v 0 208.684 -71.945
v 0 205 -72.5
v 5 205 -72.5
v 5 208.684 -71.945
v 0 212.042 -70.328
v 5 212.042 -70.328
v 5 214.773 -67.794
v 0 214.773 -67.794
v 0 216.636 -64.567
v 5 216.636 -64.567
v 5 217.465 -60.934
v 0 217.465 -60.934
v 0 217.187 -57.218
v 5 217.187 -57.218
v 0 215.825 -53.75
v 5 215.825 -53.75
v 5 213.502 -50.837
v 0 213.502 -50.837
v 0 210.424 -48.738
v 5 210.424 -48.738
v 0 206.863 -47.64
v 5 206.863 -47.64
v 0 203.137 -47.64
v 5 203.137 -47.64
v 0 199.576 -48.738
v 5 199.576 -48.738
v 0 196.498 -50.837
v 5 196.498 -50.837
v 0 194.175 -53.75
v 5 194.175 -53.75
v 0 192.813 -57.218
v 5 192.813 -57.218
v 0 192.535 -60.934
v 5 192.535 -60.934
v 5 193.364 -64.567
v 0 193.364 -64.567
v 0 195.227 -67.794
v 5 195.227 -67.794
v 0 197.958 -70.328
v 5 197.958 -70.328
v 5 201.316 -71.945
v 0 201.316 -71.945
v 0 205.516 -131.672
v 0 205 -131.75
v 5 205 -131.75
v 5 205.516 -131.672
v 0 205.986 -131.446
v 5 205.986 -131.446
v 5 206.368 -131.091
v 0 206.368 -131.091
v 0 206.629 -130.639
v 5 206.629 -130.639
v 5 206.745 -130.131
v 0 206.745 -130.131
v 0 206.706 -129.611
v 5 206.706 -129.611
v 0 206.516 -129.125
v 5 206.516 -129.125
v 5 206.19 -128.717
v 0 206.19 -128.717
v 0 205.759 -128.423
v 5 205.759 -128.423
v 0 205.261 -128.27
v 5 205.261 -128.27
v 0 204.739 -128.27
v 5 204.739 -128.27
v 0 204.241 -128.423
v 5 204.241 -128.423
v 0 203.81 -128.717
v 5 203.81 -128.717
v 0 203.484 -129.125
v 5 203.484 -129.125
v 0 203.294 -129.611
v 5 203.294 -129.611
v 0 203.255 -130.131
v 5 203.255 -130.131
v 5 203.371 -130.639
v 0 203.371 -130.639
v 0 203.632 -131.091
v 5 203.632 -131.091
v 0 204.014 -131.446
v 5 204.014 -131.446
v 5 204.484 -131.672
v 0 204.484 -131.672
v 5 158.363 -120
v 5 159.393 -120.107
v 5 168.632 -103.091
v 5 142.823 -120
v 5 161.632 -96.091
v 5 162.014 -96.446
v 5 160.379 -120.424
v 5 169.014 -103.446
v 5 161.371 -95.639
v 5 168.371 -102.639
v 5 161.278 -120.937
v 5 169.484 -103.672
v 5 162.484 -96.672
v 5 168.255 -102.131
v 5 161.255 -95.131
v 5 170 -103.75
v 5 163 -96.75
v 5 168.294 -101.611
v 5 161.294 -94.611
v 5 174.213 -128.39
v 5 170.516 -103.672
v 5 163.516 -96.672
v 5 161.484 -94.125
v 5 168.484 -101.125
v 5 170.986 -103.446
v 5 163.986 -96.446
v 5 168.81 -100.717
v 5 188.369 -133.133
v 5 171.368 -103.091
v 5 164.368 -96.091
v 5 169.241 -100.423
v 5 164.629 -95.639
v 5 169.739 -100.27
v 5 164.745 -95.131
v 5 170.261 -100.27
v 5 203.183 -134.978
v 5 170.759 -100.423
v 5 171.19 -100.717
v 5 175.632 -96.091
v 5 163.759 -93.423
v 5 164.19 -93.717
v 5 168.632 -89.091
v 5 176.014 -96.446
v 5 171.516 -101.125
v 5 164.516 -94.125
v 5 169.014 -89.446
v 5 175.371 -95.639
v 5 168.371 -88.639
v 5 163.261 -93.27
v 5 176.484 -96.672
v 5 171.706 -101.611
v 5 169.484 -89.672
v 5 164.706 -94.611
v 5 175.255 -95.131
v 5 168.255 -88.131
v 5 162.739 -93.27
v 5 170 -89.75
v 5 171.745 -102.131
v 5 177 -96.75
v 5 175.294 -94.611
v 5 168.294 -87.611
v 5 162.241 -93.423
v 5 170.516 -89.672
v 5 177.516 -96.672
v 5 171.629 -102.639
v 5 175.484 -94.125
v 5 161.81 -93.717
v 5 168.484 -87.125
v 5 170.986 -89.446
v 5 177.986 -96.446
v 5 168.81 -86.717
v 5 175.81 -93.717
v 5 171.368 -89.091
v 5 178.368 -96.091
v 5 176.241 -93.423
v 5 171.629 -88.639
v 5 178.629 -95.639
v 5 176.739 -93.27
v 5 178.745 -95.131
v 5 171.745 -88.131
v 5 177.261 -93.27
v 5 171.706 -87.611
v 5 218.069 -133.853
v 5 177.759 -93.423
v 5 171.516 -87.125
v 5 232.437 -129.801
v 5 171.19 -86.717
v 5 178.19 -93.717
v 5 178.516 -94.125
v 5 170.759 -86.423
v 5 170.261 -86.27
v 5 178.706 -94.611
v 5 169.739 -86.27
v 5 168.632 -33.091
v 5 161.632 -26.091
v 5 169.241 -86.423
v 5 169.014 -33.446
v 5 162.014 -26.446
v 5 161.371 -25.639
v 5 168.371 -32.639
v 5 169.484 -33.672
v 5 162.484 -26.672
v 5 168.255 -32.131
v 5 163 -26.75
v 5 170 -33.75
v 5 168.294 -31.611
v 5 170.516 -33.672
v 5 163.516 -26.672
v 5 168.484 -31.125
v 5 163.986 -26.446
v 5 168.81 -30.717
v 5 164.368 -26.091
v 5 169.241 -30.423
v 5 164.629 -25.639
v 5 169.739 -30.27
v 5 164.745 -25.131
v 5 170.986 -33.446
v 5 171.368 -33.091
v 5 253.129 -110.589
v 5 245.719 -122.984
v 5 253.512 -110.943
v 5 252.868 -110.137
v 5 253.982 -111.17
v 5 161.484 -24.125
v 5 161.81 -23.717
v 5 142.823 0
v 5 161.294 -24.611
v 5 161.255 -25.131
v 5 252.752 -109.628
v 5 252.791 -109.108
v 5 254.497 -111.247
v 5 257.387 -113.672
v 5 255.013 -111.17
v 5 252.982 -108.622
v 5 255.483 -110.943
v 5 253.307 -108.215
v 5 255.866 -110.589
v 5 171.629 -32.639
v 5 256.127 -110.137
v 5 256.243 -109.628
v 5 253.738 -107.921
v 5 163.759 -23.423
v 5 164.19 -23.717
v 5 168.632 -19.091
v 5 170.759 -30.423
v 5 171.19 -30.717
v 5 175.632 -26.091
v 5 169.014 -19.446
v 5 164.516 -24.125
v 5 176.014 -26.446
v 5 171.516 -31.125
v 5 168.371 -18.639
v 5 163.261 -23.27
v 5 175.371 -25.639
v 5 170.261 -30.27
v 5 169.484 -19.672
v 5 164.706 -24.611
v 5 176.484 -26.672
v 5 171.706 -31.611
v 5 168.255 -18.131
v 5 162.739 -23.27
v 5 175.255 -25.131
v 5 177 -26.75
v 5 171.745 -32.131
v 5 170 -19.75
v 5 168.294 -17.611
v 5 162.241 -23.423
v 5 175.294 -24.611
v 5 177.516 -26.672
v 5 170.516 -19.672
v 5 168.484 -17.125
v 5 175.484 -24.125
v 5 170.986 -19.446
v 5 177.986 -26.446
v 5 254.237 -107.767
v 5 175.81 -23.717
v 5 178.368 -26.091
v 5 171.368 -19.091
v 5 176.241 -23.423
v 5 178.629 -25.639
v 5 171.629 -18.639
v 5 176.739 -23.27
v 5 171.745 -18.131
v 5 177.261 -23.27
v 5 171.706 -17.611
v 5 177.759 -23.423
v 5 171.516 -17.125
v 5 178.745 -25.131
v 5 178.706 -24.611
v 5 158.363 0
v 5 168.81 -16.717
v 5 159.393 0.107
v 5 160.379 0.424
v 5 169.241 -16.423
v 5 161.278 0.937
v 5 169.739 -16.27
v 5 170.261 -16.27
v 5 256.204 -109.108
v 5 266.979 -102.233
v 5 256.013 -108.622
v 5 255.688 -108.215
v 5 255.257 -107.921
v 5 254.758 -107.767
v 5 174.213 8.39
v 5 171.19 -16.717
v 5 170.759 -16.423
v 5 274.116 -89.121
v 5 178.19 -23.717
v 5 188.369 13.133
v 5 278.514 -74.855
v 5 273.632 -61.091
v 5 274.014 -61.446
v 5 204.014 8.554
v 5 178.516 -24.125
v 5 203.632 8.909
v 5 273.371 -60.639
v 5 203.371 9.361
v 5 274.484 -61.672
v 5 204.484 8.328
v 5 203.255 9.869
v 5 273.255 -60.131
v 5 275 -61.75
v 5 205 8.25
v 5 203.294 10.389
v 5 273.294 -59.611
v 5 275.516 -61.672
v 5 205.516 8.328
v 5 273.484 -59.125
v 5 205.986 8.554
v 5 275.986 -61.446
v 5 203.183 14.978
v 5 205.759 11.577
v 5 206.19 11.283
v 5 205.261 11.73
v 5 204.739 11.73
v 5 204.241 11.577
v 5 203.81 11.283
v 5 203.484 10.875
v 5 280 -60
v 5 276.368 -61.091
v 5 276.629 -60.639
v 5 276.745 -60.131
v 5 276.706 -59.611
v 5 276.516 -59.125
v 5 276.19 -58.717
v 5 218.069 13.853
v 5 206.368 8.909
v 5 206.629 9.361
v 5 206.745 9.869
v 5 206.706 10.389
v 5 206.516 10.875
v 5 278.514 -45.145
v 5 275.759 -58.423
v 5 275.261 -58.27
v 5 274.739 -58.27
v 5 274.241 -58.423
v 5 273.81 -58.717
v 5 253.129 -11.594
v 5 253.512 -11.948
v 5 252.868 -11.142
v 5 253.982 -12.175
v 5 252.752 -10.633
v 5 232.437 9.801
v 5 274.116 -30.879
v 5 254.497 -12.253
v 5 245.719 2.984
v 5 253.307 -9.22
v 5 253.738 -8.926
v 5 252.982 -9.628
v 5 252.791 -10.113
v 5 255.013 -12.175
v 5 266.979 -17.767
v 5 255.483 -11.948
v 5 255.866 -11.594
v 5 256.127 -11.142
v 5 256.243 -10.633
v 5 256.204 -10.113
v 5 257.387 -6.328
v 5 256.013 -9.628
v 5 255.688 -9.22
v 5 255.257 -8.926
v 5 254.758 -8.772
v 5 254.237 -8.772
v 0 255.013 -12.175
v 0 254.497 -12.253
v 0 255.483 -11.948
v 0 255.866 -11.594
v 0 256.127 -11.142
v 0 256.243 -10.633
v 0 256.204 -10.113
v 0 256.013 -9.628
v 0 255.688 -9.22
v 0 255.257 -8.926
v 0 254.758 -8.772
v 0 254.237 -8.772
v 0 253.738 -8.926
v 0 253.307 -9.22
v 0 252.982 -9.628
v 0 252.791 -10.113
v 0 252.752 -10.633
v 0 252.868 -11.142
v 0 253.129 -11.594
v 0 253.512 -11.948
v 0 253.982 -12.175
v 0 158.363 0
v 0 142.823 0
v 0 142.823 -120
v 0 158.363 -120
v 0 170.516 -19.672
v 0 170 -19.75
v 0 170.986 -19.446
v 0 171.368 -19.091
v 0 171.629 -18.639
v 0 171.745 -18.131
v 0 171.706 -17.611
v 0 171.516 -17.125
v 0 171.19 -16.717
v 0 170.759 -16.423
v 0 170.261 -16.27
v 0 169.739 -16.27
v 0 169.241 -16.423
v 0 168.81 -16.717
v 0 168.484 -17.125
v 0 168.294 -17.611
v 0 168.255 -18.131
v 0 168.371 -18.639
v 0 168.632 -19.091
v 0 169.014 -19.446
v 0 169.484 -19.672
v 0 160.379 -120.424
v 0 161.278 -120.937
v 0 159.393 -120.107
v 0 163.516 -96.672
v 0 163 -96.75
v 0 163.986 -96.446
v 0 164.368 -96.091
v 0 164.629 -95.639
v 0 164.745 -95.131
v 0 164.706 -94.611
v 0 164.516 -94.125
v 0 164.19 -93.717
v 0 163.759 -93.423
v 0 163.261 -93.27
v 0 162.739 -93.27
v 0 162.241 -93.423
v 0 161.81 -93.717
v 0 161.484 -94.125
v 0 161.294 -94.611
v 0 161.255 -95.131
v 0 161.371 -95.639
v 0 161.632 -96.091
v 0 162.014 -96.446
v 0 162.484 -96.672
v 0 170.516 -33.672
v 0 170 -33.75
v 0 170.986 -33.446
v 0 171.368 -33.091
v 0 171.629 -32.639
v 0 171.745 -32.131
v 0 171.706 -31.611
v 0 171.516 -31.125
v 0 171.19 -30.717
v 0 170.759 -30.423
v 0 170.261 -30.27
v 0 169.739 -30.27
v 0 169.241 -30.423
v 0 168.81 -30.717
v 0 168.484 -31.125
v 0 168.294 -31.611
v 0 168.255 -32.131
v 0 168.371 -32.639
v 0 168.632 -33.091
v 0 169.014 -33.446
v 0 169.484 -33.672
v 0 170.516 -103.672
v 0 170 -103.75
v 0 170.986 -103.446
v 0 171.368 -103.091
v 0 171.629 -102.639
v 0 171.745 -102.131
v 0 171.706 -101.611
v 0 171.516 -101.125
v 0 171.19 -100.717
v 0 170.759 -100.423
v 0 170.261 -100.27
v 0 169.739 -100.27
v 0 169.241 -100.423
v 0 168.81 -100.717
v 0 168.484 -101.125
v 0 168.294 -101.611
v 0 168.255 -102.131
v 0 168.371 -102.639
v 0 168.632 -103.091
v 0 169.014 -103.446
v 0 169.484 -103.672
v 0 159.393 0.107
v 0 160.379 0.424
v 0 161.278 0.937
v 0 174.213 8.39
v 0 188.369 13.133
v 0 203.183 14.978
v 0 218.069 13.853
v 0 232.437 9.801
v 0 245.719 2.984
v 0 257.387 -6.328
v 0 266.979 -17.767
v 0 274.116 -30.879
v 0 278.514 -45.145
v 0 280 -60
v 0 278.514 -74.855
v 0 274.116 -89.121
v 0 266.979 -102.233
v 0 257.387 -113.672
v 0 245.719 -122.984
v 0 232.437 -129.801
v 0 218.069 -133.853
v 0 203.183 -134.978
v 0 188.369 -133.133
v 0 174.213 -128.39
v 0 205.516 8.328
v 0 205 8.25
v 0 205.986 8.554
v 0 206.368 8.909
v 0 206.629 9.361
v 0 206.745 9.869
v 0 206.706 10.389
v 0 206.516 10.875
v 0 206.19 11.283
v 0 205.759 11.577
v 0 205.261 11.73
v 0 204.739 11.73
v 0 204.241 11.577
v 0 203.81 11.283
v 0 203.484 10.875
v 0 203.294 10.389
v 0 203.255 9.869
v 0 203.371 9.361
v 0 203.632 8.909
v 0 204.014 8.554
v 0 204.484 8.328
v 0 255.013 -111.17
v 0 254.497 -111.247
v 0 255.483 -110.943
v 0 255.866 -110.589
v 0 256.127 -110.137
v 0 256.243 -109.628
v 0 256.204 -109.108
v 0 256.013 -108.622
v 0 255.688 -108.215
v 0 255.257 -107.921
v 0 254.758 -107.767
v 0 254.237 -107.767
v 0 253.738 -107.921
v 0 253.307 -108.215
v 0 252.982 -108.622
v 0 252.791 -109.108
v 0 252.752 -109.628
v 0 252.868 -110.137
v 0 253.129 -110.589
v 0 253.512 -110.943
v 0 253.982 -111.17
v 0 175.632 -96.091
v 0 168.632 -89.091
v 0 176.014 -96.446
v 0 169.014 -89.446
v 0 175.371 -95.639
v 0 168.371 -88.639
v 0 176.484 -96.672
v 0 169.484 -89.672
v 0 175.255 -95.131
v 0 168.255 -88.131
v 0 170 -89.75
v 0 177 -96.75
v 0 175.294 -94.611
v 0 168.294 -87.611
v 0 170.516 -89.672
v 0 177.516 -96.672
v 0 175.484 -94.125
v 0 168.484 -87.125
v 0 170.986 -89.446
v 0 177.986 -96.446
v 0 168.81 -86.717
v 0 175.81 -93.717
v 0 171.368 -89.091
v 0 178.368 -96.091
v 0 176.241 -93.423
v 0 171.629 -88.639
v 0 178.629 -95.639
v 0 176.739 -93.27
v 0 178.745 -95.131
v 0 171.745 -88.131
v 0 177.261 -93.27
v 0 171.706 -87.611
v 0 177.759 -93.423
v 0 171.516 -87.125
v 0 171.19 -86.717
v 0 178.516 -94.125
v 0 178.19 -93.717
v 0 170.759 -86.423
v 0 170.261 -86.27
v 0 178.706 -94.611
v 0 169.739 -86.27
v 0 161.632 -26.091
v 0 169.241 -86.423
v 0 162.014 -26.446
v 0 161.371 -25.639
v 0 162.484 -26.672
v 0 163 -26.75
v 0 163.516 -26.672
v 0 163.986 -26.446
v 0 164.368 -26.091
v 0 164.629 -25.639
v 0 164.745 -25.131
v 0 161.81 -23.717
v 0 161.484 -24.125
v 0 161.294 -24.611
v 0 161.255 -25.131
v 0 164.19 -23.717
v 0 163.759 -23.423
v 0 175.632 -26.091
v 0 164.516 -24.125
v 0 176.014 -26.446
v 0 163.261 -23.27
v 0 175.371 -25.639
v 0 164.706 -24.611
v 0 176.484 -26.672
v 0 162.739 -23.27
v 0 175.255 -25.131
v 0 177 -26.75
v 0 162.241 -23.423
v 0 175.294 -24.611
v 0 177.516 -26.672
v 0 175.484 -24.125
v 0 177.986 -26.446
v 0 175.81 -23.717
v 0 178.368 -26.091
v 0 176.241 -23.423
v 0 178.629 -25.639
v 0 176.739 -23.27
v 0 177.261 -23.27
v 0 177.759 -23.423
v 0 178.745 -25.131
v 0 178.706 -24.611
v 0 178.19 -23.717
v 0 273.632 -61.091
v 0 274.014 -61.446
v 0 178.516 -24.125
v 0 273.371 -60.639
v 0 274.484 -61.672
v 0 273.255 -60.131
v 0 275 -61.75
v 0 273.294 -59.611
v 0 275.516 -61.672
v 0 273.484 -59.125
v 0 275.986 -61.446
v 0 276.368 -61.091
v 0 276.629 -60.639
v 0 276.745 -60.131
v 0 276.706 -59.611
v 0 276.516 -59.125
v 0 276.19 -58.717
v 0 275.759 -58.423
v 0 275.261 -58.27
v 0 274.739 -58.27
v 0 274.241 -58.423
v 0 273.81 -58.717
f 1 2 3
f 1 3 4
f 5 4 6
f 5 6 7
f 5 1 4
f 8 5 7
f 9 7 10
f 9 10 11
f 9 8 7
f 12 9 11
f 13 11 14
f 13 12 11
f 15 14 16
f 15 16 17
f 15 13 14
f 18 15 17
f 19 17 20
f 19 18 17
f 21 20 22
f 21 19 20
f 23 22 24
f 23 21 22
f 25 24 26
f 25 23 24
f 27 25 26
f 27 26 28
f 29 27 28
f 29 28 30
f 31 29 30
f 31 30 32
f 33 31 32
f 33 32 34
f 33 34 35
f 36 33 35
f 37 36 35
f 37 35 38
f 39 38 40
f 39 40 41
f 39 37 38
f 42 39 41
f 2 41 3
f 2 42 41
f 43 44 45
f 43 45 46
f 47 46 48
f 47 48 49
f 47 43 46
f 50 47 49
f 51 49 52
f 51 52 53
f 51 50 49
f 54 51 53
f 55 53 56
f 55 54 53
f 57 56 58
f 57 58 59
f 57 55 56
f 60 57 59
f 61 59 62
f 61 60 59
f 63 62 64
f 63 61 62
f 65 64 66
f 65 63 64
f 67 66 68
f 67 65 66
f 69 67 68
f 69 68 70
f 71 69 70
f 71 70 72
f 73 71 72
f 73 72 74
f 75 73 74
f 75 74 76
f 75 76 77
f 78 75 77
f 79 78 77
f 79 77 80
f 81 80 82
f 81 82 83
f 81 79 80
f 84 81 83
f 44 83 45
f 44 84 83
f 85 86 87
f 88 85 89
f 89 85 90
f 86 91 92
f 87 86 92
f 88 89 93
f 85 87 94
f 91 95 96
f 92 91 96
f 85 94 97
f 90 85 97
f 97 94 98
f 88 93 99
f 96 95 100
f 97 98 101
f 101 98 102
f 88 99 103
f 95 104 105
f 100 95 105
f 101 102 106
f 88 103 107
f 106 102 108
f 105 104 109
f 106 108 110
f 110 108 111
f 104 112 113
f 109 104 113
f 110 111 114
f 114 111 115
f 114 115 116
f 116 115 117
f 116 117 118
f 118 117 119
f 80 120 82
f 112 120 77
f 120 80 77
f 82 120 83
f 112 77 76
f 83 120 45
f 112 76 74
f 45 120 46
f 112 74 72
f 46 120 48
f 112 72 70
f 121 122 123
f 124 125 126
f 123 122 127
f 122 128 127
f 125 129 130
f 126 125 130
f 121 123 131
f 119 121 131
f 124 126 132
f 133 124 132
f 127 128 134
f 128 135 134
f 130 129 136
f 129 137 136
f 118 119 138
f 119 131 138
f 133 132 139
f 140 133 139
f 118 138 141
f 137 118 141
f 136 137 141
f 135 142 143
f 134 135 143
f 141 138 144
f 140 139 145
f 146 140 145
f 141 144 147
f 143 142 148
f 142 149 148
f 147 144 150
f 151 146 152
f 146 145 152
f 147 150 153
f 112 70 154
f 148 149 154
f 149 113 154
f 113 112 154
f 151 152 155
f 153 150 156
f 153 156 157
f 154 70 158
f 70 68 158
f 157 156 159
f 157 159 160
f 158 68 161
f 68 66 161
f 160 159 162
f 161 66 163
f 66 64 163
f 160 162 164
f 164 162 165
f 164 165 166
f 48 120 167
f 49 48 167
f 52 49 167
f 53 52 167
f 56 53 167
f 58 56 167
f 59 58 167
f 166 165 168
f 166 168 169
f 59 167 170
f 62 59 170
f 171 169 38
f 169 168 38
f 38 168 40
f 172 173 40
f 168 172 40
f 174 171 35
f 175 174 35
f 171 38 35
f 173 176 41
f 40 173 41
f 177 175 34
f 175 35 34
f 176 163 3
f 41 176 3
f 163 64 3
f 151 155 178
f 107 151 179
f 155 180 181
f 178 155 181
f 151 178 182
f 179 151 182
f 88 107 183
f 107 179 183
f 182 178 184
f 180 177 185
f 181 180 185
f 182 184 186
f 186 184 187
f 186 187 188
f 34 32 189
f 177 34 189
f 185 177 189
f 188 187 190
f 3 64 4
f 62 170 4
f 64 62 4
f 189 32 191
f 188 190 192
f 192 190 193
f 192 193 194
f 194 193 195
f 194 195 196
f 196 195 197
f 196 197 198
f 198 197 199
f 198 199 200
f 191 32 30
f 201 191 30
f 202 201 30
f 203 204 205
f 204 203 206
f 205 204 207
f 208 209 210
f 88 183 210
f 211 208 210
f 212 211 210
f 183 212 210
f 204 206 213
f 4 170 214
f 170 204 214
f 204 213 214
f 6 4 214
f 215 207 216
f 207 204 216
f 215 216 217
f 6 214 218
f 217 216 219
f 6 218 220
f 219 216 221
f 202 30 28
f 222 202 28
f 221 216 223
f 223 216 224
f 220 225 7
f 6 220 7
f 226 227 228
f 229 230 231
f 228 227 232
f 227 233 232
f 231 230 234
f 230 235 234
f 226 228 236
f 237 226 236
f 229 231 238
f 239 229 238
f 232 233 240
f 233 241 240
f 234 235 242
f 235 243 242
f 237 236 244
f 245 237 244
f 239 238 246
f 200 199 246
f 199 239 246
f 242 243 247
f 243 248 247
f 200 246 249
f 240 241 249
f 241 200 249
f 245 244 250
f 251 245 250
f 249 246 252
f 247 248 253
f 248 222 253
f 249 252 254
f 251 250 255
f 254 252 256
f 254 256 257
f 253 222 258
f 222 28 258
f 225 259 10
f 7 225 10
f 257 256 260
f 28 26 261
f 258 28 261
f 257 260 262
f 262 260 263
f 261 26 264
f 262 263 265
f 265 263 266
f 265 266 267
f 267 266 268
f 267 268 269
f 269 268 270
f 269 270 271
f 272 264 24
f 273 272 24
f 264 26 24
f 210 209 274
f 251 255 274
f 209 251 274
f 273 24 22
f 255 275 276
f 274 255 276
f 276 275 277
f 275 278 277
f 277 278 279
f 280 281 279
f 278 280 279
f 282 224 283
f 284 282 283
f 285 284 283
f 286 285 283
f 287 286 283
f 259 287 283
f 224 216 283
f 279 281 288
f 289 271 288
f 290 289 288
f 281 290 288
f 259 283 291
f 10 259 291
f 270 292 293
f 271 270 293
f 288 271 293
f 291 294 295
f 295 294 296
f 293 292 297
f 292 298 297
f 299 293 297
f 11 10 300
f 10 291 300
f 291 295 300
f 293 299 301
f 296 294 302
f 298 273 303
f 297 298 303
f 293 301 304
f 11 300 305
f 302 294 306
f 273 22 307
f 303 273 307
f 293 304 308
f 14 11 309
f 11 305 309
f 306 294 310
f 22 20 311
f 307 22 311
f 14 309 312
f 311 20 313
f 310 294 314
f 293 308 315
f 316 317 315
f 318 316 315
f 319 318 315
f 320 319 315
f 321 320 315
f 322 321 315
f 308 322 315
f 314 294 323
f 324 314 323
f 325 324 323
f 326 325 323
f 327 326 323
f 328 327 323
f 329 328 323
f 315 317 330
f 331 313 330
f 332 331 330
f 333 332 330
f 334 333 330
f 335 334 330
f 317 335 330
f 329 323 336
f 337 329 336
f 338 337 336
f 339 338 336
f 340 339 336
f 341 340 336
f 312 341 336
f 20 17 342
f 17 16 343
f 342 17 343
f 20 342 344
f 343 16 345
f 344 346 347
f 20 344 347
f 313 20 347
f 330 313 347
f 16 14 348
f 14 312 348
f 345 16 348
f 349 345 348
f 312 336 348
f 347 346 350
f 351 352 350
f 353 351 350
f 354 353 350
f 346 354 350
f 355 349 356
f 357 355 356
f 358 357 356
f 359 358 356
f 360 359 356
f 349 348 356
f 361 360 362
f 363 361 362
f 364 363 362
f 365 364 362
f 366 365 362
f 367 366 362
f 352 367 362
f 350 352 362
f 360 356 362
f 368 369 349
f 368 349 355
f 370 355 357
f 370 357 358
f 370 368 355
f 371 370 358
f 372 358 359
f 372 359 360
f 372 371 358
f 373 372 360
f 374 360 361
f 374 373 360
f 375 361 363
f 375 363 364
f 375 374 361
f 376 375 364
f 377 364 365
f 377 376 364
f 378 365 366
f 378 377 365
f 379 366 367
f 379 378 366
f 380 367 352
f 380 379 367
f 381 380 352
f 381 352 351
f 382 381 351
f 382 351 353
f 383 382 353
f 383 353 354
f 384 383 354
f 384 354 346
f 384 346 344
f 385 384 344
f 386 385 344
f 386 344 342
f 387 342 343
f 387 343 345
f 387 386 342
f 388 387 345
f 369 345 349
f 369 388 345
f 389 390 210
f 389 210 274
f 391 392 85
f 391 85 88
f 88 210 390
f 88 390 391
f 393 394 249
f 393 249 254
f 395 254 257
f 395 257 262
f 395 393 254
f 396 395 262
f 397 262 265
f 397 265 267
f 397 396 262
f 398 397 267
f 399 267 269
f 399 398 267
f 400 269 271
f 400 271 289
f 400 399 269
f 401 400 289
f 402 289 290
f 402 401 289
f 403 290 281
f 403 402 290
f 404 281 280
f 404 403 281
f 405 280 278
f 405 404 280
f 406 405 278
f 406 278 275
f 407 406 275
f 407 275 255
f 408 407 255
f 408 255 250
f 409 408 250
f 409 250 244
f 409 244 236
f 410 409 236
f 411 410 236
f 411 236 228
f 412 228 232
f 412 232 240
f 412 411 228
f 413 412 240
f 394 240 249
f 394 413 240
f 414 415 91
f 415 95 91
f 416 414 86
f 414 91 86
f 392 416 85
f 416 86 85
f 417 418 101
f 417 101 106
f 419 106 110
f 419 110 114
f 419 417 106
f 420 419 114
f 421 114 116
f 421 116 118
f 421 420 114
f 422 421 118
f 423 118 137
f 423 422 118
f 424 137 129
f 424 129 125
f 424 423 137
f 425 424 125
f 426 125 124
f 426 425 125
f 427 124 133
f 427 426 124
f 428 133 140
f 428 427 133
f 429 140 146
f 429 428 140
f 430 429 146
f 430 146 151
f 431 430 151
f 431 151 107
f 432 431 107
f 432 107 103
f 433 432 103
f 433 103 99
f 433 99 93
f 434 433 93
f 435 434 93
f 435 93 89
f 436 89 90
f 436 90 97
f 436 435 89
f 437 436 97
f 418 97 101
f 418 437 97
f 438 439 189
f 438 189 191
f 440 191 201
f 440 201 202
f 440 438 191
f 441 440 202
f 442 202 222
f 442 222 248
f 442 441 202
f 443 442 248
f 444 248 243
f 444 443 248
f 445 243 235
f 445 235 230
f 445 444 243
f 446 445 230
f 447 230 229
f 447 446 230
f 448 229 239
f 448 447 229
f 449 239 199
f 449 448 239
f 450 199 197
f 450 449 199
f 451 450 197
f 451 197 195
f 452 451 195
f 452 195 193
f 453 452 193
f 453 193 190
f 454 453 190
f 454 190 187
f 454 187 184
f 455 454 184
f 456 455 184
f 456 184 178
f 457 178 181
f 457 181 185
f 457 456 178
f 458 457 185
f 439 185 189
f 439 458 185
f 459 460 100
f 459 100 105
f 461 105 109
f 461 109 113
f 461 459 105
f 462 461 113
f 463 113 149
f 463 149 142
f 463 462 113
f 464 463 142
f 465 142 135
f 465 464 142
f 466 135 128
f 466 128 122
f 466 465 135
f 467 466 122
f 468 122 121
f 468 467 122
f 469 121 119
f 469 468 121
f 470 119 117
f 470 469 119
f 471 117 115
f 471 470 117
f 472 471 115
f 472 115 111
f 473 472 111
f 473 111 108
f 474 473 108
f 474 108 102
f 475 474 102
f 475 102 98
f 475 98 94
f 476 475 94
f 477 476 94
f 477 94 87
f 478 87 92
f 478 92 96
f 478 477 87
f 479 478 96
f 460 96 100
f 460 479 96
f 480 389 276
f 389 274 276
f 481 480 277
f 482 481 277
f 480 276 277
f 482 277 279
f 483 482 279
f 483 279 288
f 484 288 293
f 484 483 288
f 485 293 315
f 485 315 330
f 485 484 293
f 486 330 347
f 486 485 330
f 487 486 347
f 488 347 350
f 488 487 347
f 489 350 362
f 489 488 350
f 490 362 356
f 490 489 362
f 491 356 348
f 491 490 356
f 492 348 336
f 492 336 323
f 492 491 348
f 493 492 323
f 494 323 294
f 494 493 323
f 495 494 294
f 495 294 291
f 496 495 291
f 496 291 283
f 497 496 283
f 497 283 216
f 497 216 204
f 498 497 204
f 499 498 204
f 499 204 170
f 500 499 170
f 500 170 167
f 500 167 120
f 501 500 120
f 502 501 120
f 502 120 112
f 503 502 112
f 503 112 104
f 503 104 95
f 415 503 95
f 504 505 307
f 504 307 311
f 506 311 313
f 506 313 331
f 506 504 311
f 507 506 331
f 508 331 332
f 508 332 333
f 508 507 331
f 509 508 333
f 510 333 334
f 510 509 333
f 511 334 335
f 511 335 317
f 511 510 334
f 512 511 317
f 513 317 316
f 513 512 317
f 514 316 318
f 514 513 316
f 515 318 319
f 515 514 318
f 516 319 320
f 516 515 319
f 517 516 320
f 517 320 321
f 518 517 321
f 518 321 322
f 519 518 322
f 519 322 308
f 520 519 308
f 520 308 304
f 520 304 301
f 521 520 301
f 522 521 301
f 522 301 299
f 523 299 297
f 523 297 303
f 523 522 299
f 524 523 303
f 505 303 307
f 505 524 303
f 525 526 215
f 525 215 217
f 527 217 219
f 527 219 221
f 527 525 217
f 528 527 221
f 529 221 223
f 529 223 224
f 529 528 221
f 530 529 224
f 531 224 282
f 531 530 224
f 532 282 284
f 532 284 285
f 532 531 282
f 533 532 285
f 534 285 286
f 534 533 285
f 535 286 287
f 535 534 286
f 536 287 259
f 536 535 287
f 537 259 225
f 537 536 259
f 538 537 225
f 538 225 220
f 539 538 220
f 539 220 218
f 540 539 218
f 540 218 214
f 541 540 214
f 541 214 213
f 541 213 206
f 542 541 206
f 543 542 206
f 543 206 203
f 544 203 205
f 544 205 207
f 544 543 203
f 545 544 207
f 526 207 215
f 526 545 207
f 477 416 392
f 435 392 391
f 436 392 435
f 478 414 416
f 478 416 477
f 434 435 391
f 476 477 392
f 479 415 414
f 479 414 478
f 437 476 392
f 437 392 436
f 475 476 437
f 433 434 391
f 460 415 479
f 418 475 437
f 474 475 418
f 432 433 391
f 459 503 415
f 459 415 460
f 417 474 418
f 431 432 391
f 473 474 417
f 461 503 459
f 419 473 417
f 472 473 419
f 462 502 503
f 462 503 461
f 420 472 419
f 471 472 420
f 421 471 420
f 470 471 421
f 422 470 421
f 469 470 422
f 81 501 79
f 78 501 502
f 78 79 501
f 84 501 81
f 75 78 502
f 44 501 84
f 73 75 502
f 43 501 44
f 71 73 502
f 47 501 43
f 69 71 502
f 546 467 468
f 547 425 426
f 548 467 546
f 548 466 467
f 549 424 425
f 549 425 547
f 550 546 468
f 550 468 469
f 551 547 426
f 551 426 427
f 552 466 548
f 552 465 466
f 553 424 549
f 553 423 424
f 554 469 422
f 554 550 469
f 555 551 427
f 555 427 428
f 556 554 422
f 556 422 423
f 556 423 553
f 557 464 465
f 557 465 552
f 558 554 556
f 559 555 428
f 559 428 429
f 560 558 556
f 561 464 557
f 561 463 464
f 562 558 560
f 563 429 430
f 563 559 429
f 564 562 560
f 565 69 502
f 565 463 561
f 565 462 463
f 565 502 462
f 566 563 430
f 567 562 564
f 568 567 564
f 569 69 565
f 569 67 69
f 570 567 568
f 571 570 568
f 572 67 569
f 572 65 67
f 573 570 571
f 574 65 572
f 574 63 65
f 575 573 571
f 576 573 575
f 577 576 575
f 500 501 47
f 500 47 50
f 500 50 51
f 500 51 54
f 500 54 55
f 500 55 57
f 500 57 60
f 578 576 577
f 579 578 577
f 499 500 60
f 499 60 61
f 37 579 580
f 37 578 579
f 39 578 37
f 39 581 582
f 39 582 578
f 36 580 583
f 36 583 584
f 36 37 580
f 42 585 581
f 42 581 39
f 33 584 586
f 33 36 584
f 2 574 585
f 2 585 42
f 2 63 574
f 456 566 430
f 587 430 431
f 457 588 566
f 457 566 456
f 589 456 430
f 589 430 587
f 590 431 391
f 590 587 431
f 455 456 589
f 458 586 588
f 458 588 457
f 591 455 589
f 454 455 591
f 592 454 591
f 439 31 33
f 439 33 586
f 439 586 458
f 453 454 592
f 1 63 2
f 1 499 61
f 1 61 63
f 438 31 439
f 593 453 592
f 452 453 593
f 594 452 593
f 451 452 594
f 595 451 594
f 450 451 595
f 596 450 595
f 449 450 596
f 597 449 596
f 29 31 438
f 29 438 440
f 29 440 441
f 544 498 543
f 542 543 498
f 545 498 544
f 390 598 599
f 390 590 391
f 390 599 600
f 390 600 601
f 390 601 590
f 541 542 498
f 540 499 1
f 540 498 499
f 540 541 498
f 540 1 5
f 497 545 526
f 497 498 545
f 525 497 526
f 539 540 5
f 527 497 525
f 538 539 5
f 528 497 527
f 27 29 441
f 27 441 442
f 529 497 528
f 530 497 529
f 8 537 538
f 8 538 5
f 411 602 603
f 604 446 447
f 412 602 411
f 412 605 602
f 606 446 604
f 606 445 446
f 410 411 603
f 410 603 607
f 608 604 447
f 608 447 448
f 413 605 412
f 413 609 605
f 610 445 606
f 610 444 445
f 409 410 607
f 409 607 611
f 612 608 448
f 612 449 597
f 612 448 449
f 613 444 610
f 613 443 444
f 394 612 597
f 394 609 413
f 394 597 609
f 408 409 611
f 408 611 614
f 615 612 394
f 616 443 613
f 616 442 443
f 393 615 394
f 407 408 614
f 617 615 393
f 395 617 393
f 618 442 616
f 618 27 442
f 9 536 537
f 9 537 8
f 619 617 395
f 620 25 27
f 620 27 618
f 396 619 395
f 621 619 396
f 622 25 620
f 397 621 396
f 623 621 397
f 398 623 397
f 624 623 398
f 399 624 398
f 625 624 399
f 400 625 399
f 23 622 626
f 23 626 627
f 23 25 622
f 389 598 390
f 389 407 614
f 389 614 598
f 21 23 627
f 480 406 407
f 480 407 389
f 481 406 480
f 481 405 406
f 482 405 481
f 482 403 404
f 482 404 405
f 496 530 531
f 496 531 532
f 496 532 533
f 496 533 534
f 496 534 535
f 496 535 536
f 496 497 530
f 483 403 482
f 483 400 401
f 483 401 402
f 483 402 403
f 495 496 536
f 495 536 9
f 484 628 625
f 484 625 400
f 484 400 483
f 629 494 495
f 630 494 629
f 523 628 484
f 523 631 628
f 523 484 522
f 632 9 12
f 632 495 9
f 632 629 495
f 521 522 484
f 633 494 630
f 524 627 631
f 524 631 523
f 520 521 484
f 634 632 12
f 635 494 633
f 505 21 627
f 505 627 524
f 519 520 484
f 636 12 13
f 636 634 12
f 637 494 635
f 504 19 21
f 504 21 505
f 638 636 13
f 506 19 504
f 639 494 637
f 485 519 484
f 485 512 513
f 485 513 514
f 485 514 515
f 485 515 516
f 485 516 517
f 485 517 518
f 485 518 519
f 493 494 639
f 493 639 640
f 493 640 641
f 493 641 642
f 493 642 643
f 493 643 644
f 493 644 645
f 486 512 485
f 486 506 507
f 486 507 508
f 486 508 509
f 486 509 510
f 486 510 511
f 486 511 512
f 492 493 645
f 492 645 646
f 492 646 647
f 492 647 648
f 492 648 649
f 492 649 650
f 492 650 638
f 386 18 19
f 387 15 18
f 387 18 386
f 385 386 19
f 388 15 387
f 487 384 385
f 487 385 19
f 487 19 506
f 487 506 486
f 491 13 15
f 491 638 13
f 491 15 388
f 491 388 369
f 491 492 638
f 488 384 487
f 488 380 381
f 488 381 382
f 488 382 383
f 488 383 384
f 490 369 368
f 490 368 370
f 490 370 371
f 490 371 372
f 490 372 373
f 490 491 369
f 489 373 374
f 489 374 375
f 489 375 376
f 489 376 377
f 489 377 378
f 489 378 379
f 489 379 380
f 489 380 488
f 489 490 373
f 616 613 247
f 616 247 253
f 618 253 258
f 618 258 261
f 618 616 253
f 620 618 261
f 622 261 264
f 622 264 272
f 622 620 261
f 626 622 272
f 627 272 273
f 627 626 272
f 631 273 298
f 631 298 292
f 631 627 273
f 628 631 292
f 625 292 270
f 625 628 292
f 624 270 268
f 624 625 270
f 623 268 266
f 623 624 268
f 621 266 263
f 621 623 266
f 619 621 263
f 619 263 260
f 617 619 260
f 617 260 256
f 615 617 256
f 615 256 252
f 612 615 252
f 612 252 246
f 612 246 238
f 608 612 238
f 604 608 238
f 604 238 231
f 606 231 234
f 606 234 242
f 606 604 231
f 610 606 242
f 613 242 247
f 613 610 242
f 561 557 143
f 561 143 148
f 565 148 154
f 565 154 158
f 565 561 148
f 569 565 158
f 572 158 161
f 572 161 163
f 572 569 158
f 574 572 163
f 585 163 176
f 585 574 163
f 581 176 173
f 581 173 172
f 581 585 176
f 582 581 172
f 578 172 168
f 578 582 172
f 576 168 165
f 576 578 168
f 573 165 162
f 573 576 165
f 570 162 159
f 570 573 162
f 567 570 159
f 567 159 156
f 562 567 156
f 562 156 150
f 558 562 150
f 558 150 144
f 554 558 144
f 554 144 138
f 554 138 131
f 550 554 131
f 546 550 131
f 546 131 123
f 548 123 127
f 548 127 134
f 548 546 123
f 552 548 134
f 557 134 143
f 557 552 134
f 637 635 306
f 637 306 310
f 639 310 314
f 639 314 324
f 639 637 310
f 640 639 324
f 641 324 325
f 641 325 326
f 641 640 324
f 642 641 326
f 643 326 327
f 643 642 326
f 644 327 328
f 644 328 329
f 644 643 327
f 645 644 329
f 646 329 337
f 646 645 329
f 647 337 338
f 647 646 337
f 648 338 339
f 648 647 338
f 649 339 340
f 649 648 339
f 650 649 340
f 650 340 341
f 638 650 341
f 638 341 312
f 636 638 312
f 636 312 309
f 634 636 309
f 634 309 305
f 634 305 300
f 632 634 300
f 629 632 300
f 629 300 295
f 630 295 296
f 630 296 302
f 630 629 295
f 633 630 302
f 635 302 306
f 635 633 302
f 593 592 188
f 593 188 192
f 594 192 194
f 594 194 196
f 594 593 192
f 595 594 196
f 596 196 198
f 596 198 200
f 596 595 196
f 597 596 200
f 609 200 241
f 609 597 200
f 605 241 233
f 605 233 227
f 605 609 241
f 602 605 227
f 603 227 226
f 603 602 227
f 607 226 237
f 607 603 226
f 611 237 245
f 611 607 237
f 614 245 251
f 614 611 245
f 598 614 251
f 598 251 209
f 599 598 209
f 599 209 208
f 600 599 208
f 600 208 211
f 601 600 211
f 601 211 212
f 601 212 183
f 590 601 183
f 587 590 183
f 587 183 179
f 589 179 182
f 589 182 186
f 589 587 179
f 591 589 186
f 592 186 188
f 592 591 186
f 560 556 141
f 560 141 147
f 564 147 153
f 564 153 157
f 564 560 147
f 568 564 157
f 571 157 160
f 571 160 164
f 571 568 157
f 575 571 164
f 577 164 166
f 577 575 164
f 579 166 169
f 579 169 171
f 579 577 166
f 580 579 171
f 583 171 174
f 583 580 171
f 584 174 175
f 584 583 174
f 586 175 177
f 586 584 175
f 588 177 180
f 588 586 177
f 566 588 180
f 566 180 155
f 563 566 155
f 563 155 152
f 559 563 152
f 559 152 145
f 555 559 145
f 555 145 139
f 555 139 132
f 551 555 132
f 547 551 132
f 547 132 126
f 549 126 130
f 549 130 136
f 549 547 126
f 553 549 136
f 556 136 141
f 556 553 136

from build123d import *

# Parameters (mm, degrees)
SKETCH_1_R          = 12.5
SKETCH_1_R_2        = 1.75
EXTRUDE_1_DEPTH     = 5
FILLET_1_R          = 5
SKETCH_3_R          = 1.1
CUT_EXTRUDE_2_DEPTH = 10
SKETCH_4_R          = 1.5
CUT_EXTRUDE_3_DEPTH = 10
EXTRUDE2_DEPTH      = 311.885831134
EXTRUDE2_DEPTH_BACK = 311.885831134


with BuildPart() as part:
    # 草图1 → 凸台-拉伸1 (new body)
    with BuildSketch(Plane(origin=(0, 0, 0), x_dir=(0, 0, -1), z_dir=(1, 0, 0))):
        with BuildLine():
            Line((0, 0), (0, 160))
            ThreePointArc((0, 160), (60, 280), (120, 160))
            Line((120, 160), (120, 0))
            Line((120, 0), (0, 0))
        make_face()
        with Locations((60, 205)):
            Circle(SKETCH_1_R, mode=Mode.SUBTRACT)
        with Locations((25, 177)):
            Circle(SKETCH_1_R_2, mode=Mode.SUBTRACT)
        with Locations((32, 170)):
            Circle(SKETCH_1_R_2, mode=Mode.SUBTRACT)
        with Locations((25, 163)):
            Circle(SKETCH_1_R_2, mode=Mode.SUBTRACT)
        with Locations((18, 170)):
            Circle(SKETCH_1_R_2, mode=Mode.SUBTRACT)
        with Locations((95, 177)):
            Circle(SKETCH_1_R_2, mode=Mode.SUBTRACT)
        with Locations((102, 170)):
            Circle(SKETCH_1_R_2, mode=Mode.SUBTRACT)
        with Locations((95, 163)):
            Circle(SKETCH_1_R_2, mode=Mode.SUBTRACT)
        with Locations((88, 170)):
            Circle(SKETCH_1_R_2, mode=Mode.SUBTRACT)
        with Locations((39, 140)):
            Circle(SKETCH_1_R_2, mode=Mode.SUBTRACT)
        with Locations((81, 140)):
            Circle(SKETCH_1_R_2, mode=Mode.SUBTRACT)
        with Locations((60, 275)):
            Circle(SKETCH_1_R_2, mode=Mode.SUBTRACT)
        with Locations((-10, 205)):
            Circle(SKETCH_1_R_2, mode=Mode.SUBTRACT)
        with Locations((130, 205)):
            Circle(SKETCH_1_R_2, mode=Mode.SUBTRACT)
        with Locations((10.502525317, 254.497474683)):
            Circle(SKETCH_1_R_2, mode=Mode.SUBTRACT)
        with Locations((109.497474683, 254.497474683)):
            Circle(SKETCH_1_R_2, mode=Mode.SUBTRACT)
        with Locations((5, 5)):
            Circle(SKETCH_1_R_2, mode=Mode.SUBTRACT)
        with Locations((115, 5)):
            Circle(SKETCH_1_R_2, mode=Mode.SUBTRACT)
        with Locations((5, 120)):
            Circle(SKETCH_1_R_2, mode=Mode.SUBTRACT)
        with Locations((115, 120)):
            Circle(SKETCH_1_R_2, mode=Mode.SUBTRACT)
        with BuildLine():
            Line((40.5, 81), (40.5, 59))
            ThreePointArc((40.5, 59), (39, 57.5), (37.5, 59))
            Line((37.5, 59), (37.5, 81))
            ThreePointArc((37.5, 81), (39, 82.5), (40.5, 81))
        make_face(mode=Mode.SUBTRACT)
        with BuildLine():
            Line((79.5, 81), (79.5, 59))
            ThreePointArc((79.5, 59), (81, 57.5), (82.5, 59))
            Line((82.5, 59), (82.5, 81))
            ThreePointArc((82.5, 81), (81, 82.5), (79.5, 81))
        make_face(mode=Mode.SUBTRACT)
    extrude(amount=EXTRUDE_1_DEPTH)

    # 圆角1
    fillet_1_edges = [part.edges().sort_by_distance(p)[0] for p in [
        (2.5, 0, 0),
        (2.5, 160, 0),
        (2.5, 160, -120),
        (2.5, 0, -120),
    ]]
    fillet(fillet_1_edges, radius=FILLET_1_R)

    # 草图3 → 切除-拉伸2 (cut)
    with BuildSketch(Plane.ZY):
        with Locations((-45.818141739, 127.45827935)):
            Circle(SKETCH_3_R)
        with Locations((-61.818141739, 127.45827935)):
            Circle(SKETCH_3_R)
        with Locations((-45.818141739, 91.45827935)):
            Circle(SKETCH_3_R)
        with Locations((-61.818141739, 91.45827935)):
            Circle(SKETCH_3_R)
        with BuildLine():
            Line((-20, 46.75), (-30, 46.75))
            ThreePointArc((-30, 46.75), (-31.75, 48.5), (-30, 50.25))
            Line((-30, 50.25), (-20, 50.25))
            ThreePointArc((-20, 50.25), (-18.25, 48.5), (-20, 46.75))
        make_face()
        with BuildLine():
            Line((-90, 46.75), (-100, 46.75))
            ThreePointArc((-100, 46.75), (-101.75, 48.5), (-100, 50.25))
            Line((-100, 50.25), (-90, 50.25))
            ThreePointArc((-90, 50.25), (-88.25, 48.5), (-90, 46.75))
        make_face()
        with BuildLine():
            Line((-20, 8.25), (-30, 8.25))
            ThreePointArc((-30, 8.25), (-31.75, 10), (-30, 11.75))
            Line((-30, 11.75), (-20, 11.75))
            ThreePointArc((-20, 11.75), (-18.25, 10), (-20, 8.25))
        make_face()
        with BuildLine():
            Line((-90, 8.25), (-100, 8.25))
            ThreePointArc((-100, 8.25), (-101.75, 10), (-100, 11.75))
            Line((-100, 11.75), (-90, 11.75))
            ThreePointArc((-90, 11.75), (-88.25, 10), (-90, 8.25))
        make_face()
    extrude(amount=-CUT_EXTRUDE_2_DEPTH, mode=Mode.SUBTRACT)

    # 草图4 → 切除-拉伸3 (cut)
    with BuildSketch(Plane.ZY):
        with Locations((-16.118918229, 88.740617872)):
            Circle(SKETCH_4_R)
        with Locations((-16.118918229, 64.240617872)):
            Circle(SKETCH_4_R)
        with Locations((-94, 140)):
            Circle(SKETCH_4_R)
        with Locations((-26, 140)):
            Circle(SKETCH_4_R)
        with Locations((-94, 82)):
            Circle(SKETCH_4_R)
        with Locations((-26, 82)):
            Circle(SKETCH_4_R)
    extrude(amount=-CUT_EXTRUDE_3_DEPTH, mode=Mode.SUBTRACT)

    # Sketch1 → Extrude2 (cut, two sides: drawn at the far end of the back side and taken through both)
    with BuildSketch(Plane.ZY.offset(-EXTRUDE2_DEPTH_BACK)):
        Polygon((-523.056193456, 142.822592063), (-120, 142.822592063), (0, 142.822592063), (403.056193456, 142.822592063), (403.056193456, -663.289794849), (-523.056193456, -663.289794849), align=None)
    extrude(amount=EXTRUDE2_DEPTH + EXTRUDE2_DEPTH_BACK, mode=Mode.SUBTRACT)


solid = part.part
